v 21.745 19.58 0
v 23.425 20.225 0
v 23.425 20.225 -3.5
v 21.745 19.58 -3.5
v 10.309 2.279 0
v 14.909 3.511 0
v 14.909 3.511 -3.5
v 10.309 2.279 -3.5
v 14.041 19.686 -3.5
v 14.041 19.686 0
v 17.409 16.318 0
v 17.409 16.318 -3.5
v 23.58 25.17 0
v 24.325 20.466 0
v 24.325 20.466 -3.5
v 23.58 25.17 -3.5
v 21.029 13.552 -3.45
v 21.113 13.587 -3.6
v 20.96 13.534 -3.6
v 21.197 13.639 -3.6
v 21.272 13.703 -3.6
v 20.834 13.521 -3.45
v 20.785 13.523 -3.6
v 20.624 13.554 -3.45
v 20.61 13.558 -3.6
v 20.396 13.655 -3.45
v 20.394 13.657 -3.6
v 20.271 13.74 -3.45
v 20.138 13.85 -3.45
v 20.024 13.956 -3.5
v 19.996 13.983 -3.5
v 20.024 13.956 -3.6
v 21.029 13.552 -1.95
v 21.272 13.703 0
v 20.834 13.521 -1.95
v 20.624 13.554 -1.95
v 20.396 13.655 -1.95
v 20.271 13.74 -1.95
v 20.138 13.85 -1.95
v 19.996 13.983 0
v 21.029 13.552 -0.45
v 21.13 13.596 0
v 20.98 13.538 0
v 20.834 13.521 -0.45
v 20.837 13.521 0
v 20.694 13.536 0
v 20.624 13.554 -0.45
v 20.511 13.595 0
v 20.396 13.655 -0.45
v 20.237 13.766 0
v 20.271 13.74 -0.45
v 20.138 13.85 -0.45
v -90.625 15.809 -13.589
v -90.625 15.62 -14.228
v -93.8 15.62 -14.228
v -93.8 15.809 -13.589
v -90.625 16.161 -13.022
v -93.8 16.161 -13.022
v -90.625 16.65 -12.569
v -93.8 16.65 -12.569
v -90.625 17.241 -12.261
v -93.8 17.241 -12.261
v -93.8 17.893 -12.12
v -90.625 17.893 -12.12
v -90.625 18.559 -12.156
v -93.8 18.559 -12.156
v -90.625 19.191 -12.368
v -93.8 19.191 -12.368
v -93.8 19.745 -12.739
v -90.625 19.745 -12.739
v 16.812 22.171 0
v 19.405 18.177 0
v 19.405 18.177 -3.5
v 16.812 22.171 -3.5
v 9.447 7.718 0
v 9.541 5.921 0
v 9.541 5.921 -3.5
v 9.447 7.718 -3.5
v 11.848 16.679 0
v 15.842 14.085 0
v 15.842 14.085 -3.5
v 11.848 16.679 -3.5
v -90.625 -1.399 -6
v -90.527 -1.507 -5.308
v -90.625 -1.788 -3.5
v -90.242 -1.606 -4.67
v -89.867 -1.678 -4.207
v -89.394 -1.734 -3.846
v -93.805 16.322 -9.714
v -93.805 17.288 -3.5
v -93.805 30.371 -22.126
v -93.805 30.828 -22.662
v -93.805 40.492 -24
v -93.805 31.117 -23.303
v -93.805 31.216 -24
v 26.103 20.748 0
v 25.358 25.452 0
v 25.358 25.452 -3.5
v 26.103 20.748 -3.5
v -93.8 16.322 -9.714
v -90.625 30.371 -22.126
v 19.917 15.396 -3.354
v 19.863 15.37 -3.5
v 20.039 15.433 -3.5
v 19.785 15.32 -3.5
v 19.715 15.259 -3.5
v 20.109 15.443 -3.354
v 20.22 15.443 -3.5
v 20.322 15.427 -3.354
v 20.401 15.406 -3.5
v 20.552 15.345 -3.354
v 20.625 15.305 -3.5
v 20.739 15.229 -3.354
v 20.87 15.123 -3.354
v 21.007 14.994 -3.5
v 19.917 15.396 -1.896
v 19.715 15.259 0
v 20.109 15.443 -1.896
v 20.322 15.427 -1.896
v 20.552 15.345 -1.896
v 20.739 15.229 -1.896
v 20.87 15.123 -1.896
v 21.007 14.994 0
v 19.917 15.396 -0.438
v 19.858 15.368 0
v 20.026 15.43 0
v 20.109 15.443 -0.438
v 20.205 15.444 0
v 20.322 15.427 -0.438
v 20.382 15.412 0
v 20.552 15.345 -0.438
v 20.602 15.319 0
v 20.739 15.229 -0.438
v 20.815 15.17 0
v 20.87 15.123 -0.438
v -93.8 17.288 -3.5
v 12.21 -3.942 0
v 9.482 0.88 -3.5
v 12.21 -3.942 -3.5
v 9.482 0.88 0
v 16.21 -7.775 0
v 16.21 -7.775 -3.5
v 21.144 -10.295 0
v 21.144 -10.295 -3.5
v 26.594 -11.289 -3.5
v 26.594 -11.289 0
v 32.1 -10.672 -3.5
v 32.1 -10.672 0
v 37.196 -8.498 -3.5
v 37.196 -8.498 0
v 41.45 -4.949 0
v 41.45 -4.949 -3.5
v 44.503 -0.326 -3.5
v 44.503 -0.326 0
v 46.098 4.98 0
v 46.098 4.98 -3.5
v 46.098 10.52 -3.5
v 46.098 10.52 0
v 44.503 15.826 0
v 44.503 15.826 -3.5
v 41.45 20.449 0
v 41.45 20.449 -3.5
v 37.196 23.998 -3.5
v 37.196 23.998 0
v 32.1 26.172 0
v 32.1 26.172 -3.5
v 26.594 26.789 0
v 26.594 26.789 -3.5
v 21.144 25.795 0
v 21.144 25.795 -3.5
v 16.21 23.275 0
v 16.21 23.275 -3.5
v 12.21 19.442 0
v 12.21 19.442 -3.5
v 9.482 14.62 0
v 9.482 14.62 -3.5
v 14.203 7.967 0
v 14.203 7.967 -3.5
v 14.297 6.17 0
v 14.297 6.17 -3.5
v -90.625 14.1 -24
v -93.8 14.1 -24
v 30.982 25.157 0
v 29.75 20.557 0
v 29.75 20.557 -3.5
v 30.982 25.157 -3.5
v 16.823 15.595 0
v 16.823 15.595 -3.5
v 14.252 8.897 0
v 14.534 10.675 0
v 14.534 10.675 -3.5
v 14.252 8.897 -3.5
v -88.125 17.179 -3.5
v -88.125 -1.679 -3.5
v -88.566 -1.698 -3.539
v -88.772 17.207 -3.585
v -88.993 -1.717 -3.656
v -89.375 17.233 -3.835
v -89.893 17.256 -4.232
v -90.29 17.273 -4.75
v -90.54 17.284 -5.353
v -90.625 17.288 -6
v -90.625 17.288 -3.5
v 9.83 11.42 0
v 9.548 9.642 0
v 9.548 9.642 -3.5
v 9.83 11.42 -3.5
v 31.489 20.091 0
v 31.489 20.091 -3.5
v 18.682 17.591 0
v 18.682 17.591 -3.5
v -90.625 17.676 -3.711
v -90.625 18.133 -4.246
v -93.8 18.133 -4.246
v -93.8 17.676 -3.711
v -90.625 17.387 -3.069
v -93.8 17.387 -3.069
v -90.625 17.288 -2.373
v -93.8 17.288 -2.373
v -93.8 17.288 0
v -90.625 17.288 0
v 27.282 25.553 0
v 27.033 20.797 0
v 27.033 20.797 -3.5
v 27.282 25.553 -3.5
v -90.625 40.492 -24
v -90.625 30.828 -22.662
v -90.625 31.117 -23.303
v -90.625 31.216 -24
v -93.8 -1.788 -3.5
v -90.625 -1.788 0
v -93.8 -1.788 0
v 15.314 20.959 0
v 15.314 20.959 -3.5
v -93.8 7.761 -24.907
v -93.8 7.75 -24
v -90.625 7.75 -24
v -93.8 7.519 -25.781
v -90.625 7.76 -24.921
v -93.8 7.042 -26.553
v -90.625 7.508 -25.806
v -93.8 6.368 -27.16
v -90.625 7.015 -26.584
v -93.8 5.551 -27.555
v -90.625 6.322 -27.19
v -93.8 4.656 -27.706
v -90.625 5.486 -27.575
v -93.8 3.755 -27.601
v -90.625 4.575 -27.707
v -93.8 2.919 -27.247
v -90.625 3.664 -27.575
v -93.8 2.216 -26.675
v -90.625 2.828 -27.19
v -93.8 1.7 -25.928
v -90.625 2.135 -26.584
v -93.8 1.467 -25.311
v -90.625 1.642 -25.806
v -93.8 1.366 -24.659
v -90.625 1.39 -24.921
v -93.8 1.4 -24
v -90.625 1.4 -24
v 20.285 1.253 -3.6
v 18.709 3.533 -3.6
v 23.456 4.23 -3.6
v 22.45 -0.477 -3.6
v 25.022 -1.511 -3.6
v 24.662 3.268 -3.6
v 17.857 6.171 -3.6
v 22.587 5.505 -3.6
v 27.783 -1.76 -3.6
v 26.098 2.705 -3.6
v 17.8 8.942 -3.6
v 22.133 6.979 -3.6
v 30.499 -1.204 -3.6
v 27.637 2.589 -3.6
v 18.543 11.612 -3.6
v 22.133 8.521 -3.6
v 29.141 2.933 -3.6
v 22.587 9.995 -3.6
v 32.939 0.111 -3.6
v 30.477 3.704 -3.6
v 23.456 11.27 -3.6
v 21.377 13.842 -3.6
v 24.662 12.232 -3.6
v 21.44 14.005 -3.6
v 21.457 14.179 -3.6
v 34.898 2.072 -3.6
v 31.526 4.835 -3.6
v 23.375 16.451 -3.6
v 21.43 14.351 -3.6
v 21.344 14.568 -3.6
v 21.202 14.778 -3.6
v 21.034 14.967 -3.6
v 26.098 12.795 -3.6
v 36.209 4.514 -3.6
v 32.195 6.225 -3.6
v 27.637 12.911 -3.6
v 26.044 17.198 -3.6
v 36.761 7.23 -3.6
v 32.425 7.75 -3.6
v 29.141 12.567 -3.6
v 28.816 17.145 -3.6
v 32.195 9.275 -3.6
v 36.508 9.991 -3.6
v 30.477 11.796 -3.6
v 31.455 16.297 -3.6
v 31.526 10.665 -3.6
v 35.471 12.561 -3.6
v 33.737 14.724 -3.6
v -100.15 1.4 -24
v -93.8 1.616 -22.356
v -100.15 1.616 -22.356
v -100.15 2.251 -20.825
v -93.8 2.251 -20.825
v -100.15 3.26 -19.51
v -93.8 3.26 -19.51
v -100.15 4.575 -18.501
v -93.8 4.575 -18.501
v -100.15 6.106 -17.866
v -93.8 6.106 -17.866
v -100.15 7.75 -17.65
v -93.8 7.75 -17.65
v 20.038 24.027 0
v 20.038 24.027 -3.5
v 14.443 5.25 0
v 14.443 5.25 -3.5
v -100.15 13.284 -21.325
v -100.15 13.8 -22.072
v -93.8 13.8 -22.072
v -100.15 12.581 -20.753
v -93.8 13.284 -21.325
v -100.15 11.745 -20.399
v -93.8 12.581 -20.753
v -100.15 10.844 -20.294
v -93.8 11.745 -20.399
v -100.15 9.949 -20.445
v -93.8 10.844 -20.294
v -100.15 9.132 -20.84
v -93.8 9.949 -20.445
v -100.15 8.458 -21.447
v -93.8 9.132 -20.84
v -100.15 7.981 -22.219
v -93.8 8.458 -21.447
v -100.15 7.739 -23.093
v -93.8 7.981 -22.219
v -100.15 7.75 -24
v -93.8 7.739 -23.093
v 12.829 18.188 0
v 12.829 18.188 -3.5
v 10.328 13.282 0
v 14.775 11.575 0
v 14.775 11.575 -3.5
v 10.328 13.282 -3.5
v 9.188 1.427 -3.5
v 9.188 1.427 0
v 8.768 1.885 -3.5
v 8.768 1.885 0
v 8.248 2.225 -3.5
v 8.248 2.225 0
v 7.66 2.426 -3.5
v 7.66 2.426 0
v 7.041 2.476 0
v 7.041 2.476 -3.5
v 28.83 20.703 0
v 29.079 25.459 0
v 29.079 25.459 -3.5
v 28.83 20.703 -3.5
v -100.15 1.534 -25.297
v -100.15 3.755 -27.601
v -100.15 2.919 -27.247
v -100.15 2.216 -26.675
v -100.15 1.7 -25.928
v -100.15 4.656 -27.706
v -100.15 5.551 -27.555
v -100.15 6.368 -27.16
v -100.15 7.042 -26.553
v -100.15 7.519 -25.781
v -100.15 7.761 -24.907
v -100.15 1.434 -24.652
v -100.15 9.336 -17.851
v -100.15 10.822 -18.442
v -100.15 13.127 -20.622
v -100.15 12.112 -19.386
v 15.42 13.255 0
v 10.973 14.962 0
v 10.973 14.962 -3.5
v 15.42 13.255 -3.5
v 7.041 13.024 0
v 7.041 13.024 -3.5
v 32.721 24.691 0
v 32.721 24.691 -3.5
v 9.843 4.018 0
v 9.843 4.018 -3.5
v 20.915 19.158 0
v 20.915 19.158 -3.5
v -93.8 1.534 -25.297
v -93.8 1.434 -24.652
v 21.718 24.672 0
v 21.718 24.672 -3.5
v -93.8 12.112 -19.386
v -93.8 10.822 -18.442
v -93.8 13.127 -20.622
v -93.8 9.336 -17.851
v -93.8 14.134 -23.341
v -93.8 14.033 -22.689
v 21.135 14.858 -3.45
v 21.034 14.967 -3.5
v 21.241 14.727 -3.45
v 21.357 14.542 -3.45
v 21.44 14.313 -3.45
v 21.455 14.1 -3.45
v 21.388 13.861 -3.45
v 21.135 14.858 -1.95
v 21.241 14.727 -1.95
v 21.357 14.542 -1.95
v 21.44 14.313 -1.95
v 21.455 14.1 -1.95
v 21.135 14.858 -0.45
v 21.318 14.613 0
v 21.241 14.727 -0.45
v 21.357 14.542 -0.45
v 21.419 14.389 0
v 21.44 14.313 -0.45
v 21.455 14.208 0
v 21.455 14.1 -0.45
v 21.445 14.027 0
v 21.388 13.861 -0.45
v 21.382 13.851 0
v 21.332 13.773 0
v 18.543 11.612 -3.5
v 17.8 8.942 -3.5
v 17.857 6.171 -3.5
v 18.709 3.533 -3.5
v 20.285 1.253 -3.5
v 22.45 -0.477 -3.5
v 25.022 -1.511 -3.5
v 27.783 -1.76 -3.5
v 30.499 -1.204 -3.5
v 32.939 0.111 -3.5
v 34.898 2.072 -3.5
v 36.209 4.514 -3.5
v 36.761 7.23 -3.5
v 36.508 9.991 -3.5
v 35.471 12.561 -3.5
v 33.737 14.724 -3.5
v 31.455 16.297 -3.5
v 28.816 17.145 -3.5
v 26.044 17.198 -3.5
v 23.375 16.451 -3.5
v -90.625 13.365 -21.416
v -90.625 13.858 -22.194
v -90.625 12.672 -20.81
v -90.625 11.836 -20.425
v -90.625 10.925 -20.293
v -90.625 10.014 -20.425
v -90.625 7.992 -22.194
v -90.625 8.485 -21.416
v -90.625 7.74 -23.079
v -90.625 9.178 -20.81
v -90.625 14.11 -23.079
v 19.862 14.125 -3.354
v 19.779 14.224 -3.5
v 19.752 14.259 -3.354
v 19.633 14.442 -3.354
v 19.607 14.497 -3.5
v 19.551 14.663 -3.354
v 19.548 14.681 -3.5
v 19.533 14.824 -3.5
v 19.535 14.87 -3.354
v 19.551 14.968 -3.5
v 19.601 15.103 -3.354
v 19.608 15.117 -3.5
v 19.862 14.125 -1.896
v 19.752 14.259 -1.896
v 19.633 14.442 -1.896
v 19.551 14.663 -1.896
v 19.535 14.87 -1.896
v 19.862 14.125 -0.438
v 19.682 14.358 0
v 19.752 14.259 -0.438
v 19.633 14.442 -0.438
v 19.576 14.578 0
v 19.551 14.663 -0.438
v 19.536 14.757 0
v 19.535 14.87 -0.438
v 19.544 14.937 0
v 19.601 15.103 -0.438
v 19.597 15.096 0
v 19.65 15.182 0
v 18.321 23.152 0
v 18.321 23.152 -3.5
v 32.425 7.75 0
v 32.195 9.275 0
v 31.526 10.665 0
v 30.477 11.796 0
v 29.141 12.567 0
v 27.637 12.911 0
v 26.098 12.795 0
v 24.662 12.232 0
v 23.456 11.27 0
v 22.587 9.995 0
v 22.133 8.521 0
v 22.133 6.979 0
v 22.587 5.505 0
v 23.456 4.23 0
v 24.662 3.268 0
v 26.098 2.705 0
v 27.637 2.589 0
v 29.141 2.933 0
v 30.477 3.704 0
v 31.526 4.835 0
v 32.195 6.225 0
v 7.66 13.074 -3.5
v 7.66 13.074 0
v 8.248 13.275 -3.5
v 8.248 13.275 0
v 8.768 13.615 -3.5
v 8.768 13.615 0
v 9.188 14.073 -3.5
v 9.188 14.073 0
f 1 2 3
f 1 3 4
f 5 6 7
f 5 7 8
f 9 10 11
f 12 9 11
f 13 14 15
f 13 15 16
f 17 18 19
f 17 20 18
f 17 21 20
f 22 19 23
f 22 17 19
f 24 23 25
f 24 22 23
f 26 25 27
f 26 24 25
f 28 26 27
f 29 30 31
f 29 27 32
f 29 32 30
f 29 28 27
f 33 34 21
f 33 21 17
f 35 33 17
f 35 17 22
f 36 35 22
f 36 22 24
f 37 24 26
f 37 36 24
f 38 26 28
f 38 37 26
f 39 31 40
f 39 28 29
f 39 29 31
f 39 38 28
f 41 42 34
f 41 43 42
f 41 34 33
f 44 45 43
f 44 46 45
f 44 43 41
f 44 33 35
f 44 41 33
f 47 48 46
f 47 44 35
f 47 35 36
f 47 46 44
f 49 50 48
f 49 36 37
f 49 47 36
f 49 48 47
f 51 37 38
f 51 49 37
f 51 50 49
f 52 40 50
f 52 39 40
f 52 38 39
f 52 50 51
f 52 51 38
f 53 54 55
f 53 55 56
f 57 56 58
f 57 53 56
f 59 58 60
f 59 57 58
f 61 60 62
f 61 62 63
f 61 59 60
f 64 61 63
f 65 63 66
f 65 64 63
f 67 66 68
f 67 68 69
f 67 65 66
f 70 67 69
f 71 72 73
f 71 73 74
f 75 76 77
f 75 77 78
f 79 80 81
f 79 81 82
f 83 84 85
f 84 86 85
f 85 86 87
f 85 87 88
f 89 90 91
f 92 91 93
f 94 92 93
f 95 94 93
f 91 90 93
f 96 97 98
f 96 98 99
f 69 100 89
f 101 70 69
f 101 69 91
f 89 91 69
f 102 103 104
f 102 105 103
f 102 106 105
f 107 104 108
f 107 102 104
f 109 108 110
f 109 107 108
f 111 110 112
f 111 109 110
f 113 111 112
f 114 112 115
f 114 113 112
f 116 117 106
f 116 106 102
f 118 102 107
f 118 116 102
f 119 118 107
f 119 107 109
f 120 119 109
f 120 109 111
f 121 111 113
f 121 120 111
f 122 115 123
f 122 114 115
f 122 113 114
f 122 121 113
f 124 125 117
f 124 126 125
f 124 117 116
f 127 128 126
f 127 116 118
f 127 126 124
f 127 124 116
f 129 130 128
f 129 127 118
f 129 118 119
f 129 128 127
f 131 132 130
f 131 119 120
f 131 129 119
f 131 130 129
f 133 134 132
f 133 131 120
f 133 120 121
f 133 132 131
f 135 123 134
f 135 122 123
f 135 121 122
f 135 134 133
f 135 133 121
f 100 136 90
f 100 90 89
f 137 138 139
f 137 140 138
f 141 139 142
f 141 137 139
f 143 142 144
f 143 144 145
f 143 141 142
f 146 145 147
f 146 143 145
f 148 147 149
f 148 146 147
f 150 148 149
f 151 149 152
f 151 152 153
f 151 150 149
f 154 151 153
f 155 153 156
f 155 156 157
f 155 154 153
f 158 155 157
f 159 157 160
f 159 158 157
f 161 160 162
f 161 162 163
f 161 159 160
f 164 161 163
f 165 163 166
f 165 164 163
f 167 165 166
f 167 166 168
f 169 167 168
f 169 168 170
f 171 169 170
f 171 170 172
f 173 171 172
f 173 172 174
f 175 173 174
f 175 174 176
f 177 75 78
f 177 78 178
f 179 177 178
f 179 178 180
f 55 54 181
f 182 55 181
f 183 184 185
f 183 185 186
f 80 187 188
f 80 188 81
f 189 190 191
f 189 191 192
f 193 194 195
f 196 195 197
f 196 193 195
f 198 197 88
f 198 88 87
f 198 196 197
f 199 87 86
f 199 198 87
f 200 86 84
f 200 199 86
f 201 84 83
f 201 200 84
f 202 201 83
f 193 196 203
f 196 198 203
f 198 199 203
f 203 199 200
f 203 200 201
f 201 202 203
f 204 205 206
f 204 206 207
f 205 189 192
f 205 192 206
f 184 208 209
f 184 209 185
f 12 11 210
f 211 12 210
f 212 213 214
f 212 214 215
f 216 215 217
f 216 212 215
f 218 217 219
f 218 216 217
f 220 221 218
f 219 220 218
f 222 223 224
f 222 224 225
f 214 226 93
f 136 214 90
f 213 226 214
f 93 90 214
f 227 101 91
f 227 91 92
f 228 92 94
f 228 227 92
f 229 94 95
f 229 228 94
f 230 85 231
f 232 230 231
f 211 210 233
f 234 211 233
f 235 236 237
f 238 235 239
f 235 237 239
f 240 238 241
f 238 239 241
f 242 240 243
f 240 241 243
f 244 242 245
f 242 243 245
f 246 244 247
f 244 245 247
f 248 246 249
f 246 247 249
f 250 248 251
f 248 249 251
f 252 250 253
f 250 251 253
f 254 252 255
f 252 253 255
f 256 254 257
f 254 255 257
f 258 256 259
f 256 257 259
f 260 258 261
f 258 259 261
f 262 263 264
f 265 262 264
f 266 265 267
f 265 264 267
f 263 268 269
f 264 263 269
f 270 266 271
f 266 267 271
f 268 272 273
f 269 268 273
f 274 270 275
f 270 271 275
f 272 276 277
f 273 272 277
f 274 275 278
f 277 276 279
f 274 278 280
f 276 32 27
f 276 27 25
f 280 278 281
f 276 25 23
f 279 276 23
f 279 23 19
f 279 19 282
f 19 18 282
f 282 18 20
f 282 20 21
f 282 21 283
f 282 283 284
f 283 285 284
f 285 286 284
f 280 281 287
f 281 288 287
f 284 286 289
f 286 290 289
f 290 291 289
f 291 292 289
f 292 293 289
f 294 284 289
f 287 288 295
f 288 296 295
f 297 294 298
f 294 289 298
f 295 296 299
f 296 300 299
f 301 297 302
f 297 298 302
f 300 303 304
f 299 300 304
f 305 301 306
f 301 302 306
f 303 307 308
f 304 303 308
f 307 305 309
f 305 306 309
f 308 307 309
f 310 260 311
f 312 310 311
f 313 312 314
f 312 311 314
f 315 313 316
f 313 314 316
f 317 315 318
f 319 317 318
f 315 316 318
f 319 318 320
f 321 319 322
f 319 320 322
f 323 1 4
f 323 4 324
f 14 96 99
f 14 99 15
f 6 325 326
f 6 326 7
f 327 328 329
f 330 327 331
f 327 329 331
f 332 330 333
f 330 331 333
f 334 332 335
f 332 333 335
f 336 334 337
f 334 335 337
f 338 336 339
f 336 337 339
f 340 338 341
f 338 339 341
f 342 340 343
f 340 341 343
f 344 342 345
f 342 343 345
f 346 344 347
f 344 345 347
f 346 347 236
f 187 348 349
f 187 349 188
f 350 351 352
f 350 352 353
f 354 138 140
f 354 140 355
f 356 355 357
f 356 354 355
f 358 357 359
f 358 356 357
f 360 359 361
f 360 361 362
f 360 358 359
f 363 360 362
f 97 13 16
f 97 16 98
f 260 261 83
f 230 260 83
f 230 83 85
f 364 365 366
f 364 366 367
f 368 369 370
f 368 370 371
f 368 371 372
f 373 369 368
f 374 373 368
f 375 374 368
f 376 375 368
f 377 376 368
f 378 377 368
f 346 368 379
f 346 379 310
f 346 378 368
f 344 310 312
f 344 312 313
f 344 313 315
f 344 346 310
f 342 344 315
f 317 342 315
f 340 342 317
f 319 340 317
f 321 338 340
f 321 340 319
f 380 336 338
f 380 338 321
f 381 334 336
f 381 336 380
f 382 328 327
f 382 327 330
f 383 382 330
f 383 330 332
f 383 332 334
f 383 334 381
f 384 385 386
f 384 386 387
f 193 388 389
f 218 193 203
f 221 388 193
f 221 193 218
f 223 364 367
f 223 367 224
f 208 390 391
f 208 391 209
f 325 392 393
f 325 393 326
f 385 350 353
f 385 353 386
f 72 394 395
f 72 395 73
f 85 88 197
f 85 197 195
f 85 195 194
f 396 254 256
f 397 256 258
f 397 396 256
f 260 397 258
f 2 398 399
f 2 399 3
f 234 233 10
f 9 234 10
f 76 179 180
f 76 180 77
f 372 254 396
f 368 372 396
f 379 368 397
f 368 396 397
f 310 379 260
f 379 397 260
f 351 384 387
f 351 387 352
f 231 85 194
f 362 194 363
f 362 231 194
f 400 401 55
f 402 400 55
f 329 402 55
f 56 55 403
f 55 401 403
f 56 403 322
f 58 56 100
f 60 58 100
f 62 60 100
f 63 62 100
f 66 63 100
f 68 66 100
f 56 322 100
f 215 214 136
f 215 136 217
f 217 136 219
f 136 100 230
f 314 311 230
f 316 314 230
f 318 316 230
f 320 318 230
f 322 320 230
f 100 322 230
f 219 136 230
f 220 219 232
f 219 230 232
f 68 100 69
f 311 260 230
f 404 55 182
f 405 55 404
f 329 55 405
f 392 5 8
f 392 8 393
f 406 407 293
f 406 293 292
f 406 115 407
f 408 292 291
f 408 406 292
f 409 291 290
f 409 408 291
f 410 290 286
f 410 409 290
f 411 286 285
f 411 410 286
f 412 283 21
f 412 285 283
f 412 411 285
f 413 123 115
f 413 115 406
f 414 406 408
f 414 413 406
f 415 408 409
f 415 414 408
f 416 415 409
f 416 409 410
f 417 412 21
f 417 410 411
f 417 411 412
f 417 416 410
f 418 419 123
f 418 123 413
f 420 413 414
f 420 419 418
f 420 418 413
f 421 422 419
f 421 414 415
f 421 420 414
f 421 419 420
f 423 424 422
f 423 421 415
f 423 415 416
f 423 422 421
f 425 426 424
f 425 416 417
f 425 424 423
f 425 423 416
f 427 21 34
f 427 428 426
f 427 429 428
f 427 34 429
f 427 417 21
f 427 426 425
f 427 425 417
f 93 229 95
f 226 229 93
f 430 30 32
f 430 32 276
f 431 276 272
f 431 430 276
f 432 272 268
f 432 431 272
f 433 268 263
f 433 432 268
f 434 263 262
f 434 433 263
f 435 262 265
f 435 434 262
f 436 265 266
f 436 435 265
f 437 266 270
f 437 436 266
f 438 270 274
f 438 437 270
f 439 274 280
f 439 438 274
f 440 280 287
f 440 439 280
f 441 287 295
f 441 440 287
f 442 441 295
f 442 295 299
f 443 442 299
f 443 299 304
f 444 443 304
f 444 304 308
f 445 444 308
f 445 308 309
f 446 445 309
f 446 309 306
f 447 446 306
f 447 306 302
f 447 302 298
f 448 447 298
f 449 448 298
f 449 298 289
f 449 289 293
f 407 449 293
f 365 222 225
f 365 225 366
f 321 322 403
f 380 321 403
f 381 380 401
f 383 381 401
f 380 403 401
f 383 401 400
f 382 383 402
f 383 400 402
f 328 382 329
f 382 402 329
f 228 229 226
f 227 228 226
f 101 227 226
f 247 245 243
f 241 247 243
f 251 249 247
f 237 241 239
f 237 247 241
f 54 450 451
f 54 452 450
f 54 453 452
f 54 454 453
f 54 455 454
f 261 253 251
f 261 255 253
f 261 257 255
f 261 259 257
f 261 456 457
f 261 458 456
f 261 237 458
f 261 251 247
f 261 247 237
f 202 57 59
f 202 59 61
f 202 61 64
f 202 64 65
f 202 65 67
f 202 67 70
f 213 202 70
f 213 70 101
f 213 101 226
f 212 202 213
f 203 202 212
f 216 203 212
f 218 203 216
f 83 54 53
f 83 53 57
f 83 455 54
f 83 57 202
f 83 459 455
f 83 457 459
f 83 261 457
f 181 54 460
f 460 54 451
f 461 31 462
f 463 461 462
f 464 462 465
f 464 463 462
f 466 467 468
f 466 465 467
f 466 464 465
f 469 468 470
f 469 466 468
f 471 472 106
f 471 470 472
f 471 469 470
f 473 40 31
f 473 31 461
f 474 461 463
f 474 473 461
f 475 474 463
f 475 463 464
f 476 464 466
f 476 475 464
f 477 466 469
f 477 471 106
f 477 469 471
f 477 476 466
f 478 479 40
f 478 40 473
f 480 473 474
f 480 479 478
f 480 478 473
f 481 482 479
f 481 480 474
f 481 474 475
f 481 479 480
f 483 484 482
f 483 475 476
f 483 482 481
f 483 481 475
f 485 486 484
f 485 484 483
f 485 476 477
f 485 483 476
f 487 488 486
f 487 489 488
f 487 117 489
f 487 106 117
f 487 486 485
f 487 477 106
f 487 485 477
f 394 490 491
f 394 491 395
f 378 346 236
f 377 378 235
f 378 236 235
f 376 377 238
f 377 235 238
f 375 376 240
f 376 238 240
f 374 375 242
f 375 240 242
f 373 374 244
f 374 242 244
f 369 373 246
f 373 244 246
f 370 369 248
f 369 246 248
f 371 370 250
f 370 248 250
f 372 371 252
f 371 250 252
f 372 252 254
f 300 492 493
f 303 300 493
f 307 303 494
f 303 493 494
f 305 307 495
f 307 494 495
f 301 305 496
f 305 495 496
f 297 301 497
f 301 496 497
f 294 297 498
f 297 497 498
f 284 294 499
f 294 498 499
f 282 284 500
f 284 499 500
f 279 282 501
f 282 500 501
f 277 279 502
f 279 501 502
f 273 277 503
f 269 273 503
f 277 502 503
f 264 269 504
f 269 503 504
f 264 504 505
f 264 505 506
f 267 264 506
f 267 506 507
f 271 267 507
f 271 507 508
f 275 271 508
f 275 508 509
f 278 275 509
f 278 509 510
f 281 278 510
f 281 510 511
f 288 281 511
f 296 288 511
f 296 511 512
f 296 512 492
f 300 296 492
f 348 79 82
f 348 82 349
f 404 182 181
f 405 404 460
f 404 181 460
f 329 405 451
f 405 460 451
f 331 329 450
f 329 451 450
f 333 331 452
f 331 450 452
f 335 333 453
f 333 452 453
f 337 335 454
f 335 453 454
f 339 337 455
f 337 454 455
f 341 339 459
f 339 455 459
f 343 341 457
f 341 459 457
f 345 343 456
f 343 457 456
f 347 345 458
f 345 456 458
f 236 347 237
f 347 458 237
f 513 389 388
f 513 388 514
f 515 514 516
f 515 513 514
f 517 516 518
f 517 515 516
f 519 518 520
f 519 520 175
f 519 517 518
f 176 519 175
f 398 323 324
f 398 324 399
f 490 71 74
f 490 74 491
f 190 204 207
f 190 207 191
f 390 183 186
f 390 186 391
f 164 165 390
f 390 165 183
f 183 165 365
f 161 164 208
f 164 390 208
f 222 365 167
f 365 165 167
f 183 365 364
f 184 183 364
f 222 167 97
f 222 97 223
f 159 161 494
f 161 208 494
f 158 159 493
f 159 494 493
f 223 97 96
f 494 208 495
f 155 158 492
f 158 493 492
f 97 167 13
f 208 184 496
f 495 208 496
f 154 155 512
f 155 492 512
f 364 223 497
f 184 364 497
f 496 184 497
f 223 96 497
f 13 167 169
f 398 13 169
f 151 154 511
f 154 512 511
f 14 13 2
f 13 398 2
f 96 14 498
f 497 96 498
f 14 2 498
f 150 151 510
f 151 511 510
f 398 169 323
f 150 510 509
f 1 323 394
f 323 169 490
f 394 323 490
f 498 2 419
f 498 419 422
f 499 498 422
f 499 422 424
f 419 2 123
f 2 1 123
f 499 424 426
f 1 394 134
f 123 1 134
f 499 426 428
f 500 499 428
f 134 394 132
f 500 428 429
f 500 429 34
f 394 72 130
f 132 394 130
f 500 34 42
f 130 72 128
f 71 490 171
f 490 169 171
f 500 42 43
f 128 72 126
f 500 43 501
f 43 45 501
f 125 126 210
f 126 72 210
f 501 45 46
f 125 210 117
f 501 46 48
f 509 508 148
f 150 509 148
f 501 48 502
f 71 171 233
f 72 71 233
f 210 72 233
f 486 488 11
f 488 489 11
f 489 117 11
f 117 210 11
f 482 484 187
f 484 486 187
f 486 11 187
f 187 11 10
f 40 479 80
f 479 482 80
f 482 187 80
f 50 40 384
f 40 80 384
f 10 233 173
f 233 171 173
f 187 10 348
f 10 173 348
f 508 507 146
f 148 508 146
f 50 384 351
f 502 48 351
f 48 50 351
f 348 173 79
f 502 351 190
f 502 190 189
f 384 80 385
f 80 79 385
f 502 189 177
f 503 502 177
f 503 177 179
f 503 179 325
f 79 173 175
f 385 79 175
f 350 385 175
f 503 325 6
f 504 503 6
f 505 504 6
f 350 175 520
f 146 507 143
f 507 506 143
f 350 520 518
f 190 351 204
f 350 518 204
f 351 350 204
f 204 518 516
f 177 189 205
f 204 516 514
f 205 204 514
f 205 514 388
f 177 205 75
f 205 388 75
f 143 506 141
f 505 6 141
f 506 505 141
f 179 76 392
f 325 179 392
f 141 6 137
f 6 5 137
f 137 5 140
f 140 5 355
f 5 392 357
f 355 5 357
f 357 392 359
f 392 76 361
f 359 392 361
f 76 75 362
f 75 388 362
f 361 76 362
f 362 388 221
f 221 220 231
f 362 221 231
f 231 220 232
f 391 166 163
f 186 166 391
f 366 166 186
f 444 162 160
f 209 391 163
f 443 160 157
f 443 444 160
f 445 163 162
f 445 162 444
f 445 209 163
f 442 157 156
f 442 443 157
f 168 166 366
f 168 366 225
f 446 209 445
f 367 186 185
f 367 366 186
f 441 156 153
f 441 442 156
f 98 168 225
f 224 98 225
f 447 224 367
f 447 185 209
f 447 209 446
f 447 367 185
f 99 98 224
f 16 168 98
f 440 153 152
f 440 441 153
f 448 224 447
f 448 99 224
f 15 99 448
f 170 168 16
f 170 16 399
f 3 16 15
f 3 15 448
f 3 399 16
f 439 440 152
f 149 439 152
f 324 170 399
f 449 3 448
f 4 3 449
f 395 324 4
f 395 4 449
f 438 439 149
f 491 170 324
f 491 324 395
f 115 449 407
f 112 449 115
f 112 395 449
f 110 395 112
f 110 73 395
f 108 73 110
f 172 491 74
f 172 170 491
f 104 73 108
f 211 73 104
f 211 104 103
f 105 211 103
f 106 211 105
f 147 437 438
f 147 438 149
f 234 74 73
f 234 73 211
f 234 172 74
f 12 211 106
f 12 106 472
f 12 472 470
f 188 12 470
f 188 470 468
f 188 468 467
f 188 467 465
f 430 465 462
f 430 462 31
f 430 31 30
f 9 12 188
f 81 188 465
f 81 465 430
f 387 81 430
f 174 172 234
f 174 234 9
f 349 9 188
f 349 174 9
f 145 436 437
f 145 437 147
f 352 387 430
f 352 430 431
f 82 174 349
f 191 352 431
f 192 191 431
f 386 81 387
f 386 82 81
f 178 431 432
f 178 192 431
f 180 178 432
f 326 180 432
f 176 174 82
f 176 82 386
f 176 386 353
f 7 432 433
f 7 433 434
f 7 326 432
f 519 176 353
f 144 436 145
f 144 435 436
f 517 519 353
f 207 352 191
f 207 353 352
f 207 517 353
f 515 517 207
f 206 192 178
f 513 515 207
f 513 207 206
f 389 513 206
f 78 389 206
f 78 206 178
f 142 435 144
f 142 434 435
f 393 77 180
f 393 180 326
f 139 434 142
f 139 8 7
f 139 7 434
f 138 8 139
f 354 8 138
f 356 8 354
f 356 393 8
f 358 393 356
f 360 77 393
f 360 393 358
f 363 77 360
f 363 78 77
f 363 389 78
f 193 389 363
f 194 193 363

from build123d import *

# Parameters (mm, degrees)
SKETCH1_R           = 9.525
SKETCH1_R_2         = 5.175
BOSS_EXTRUDE1_DEPTH = 3.6
BOSS_EXTRUDE2_DEPTH = 3.5
SKETCH3_R           = 19.05
SKETCH3_R_2         = 5.175
BOSS_EXTRUDE3_DEPTH = 3.5
CUT_EXTRUDE1_DEPTH  = 95.573202468
BOSS_EXTRUDE4_DEPTH = 3.175
BOSS_EXTRUDE5_DEPTH = 6.35
BOSS_EXTRUDE6_DEPTH = 3.18
FILLET1_R           = 2.5


with BuildPart() as part:
    # Sketch1 → Boss-Extrude1 (new body)
    with BuildSketch(Plane.XY):
        with Locations((27.25, 7.75)):
            Circle(SKETCH1_R)
        with Locations((27.25, 7.75)):
            Circle(SKETCH1_R_2, mode=Mode.SUBTRACT)
    extrude(amount=-BOSS_EXTRUDE1_DEPTH)

    # Sketch2 → Boss-Extrude2 (add)
    with BuildSketch(Plane.XY):
        Polygon((18.995, 12.501904881), (-90.625, 17.288017443), (-90.625, -1.788017443), (18.995, 2.998095119), align=None)
    extrude(amount=-BOSS_EXTRUDE2_DEPTH)

    # Sketch3 → Boss-Extrude3 (add)
    with BuildSketch(Plane.XY):
        with Locations((27.25, 7.75)):
            Circle(SKETCH3_R)
        with Locations((27.25, 7.75)):
            Circle(SKETCH3_R_2, mode=Mode.SUBTRACT)
    extrude(amount=-BOSS_EXTRUDE3_DEPTH)

    # Sketch4 → Cut-Extrude1 (cut, through all)
    # profile 1 of 12: a face of its own
    with BuildSketch(Plane.XY):
        Polygon((19.405357851, 18.177218987), (16.811514446, 22.171387567), (18.321121469, 23.15173783), (20.914964873, 19.15756925), align=None)
    # profile 2 of 12: a face of its own
    with BuildSketch(Plane.XY):
        Polygon((17.408841373, 16.318366421), (18.681633579, 17.591158627), (15.314037534, 20.958754673), (14.041245327, 19.685962466), align=None)
    # profile 3 of 12: a face of its own
    with BuildSketch(Plane.XY):
        Polygon((21.744722833, 19.580352047), (20.037995473, 24.026528829), (21.718440241, 24.671591138), (23.425167601, 20.225414357), align=None)
    # profile 4 of 12: a face of its own
    with BuildSketch(Plane.XY):
        Polygon((24.324694845, 20.466441955), (23.579675705, 25.170307677), (25.357514718, 25.451889714), (26.102533858, 20.748023992), align=None)
    # profile 5 of 12: a face of its own
    with BuildSketch(Plane.XY):
        Polygon((27.032516729, 20.796762329), (27.281766721, 25.552735489), (29.079299883, 25.458530767), (28.830049892, 20.702557608), align=None)
    # profile 6 of 12: a face of its own
    with BuildSketch(Plane.XY):
        Polygon((29.749843676, 20.556876584), (30.982469378, 25.157098332), (32.721135866, 24.691224051), (31.488510163, 20.091002303), align=None)
    # profile 7 of 12: a face of its own
    with BuildSketch(Plane.XY):
        Polygon((15.84243075, 14.085035127), (11.84826217, 16.678878531), (12.828612433, 18.188485554), (16.822781013, 15.594642149), align=None)
    # profile 8 of 12: a face of its own
    with BuildSketch(Plane.XY):
        Polygon((14.774585643, 11.574832399), (10.328408862, 13.281559759), (10.973471171, 14.962004527), (15.419647953, 13.255277167), align=None)
    # profile 9 of 12: a face of its own
    with BuildSketch(Plane.XY):
        Polygon((14.251976008, 8.897466142), (9.548110286, 9.642485282), (9.829692323, 11.420324295), (14.533558045, 10.675305155), align=None)
    # profile 10 of 12: a face of its own
    with BuildSketch(Plane.XY):
        Polygon((14.297442392, 6.169950108), (9.541469233, 5.920700117), (9.447264511, 7.718233279), (14.203237671, 7.967483271), align=None)
    # profile 11 of 12: a face of its own
    with BuildSketch(Plane.XY):
        Polygon((14.908997697, 3.511489837), (10.308775949, 2.278864134), (9.842901668, 4.017530622), (14.443123416, 5.250156324), align=None)
    # profile 12 of 12: a face of its own
    with BuildSketch(Plane.XY):
        with BuildLine():
            add(Edge.make_bspline(
                [(19.996175693, 13.983105039), (19.972549804, 14.006974852), (19.926684107, 14.053314085), (19.862635122, 14.123340739), (19.804807719, 14.191245488), (19.753115011, 14.256928744), (19.706902346, 14.320187557), (19.667123485, 14.381475924), (19.633241886, 14.440499093), (19.605838218, 14.49786121), (19.583891907, 14.553730575), (19.565373741, 14.60828689), (19.550882076, 14.662068546), (19.540580443, 14.715204363), (19.534737441, 14.767524979), (19.532388566, 14.819113596), (19.53464102, 14.869868179), (19.540484051, 14.919643175), (19.550380726, 14.968074585), (19.563399735, 15.015027998), (19.579921539, 15.060371004), (19.600563009, 15.10350851), (19.62372625, 15.145488903), (19.651184569, 15.185108897), (19.681148524, 15.223804161), (19.703943722, 15.247425917), (19.715479913, 15.259380413)],
                knots=[0, 0, 0, 0, 1.644941701, 3.193378015, 4.647145852, 6.012736372, 7.286740979, 8.483061719, 9.58992218, 10.61798452, 11.593737178, 12.528549707, 13.438735705, 14.319919232, 15.176948591, 16.015348648, 16.846831638, 17.662602897, 18.467729349, 19.265590275, 20.047523624, 20.827953815, 21.605954429, 22.393232775, 23.186847407, 24, 24, 24, 24], degree=3))
            add(Edge.make_bspline(
                [(19.715479913, 15.259380413), (19.72757601, 15.271056951), (19.751480133, 15.294131948), (19.79059328, 15.32453002), (19.830653616, 15.352371474), (19.872934823, 15.376073956), (19.916815537, 15.396640202), (19.962550005, 15.413433609), (20.009989946, 15.427159873), (20.059028168, 15.437329522), (20.109640093, 15.443588369), (20.161391726, 15.446416818), (20.214253243, 15.443872509), (20.268139075, 15.438159389), (20.323009446, 15.427596366), (20.379119371, 15.413908829), (20.435954787, 15.394752005), (20.494277642, 15.372380194), (20.553991919, 15.345222785), (20.614763563, 15.31181632), (20.6768047, 15.272675401), (20.740699924, 15.228555913), (20.805586165, 15.178199697), (20.871982932, 15.122240246), (20.939915396, 15.060760529), (20.984561985, 15.016868227), (21.007443722, 14.994373068)],
                knots=[0, 0, 0, 0, 0.81750105, 1.615533254, 2.407168602, 3.189397808, 3.970901104, 4.762954563, 5.55742278, 6.372083968, 7.196957306, 8.037000563, 8.890477321, 9.76918381, 10.671577351, 11.607318308, 12.577284202, 13.587520184, 14.64617593, 15.76641423, 16.959043917, 18.21433275, 19.543145185, 20.953794228, 22.438794936, 24, 24, 24, 24], degree=3))
            add(Edge.make_bspline(
                [(21.007443722, 14.994373068), (21.029939345, 14.971491973), (21.07369258, 14.926989007), (21.134906952, 14.859351767), (21.190415056, 14.793244214), (21.24085702, 14.728727202), (21.285167215, 14.665378577), (21.324082766, 14.603618046), (21.35744776, 14.543475592), (21.384594418, 14.48417647), (21.406973112, 14.426279284), (21.426121387, 14.369867226), (21.439873538, 14.314050657), (21.450373252, 14.259306853), (21.456117386, 14.205282675), (21.45863553, 14.152136819), (21.455811599, 14.099963135), (21.449552444, 14.048928037), (21.439380503, 13.999468399), (21.425663125, 13.951600834), (21.408844197, 13.905459094), (21.388425087, 13.861212706), (21.364450808, 13.818808922), (21.336898184, 13.778413534), (21.306335612, 13.739270233), (21.283273208, 13.715357657), (21.271603044, 13.703257283)],
                knots=[0, 0, 0, 0, 1.562235313, 3.038495437, 4.440379466, 5.764626062, 7.024677084, 8.202776689, 9.317717587, 10.370816988, 11.375304419, 12.339374423, 13.269058028, 14.172047064, 15.051333417, 15.912249674, 16.759720868, 17.591966788, 18.41390586, 19.215513145, 20.014546285, 20.802808402, 21.585553806, 22.383400645, 23.181959475, 24, 24, 24, 24], degree=3))
            add(Edge.make_bspline(
                [(21.271603044, 13.703257283), (21.259629026, 13.691746239), (21.23604856, 13.66907751), (21.197734192, 13.638805411), (21.158183947, 13.611660672), (21.116515089, 13.588202529), (21.073534989, 13.567814799), (21.028537333, 13.551158533), (20.981994239, 13.538163004), (20.933989646, 13.528262893), (20.884634953, 13.522407258), (20.834167195, 13.520202748), (20.782683445, 13.522376174), (20.73042296, 13.5289079), (20.67731692, 13.539143901), (20.623181435, 13.553199413), (20.568109964, 13.571523386), (20.511768493, 13.594048796), (20.454021813, 13.622036447), (20.394346939, 13.655485363), (20.332806089, 13.695249792), (20.269074183, 13.740726075), (20.203509794, 13.792477155), (20.136108776, 13.850566204), (20.065946419, 13.913865736), (20.019874065, 13.959587171), (19.996175693, 13.983105039)],
                knots=[0, 0, 0, 0, 0.813987375, 1.602987522, 2.391074088, 3.163837422, 3.945068801, 4.721304689, 5.513312182, 6.312473106, 7.122201215, 7.947613738, 8.786874495, 9.645595022, 10.52768317, 11.43703601, 12.385957169, 13.371717227, 14.410080332, 15.530148071, 16.72394133, 18.000834515, 19.367826948, 20.817813834, 22.363169582, 24, 24, 24, 24], degree=3))
        make_face()
        with BuildLine():
            add(Edge.make_bspline(
                [(20.139491665, 14.120484847), (20.159842261, 14.10026479), (20.199282005, 14.06107803), (20.258825996, 14.006696987), (20.315157902, 13.956648767), (20.36946228, 13.91227584), (20.421015188, 13.872453316), (20.470698769, 13.838793642), (20.517294119, 13.809391318), (20.562274922, 13.785969667), (20.60570856, 13.766694324), (20.648080537, 13.750402661), (20.6900298, 13.737655615), (20.731300233, 13.728383676), (20.771914432, 13.721759849), (20.812064975, 13.718808576), (20.851623834, 13.719298353), (20.902639916, 13.723732634), (20.963368961, 13.736271903), (21.030845369, 13.761355865), (21.091551409, 13.796275379), (21.125667075, 13.82699342), (21.142703471, 13.842333137)],
                knots=[0, 0, 0, 0, 1.478828575, 2.865990936, 4.156734116, 5.36308544, 6.480889949, 7.513666501, 8.455984072, 9.319688948, 10.125381605, 10.904881632, 11.658652575, 12.383407565, 13.084213992, 13.778321268, 14.456017801, 15.121659285, 16.41638644, 17.638501444, 18.820734642, 20, 20, 20, 20], degree=3))
            add(Edge.make_bspline(
                [(21.142703471, 13.842333137), (21.158237309, 13.859333277), (21.189151543, 13.89316563), (21.223390961, 13.953683956), (21.248748637, 14.019779969), (21.261375212, 14.079417608), (21.265678182, 14.129451086), (21.266398281, 14.168334547), (21.262604874, 14.20785819), (21.256376505, 14.24827996), (21.246514017, 14.289516324), (21.233214252, 14.331341198), (21.217255365, 14.3741679), (21.20384511, 14.402126104), (21.196976975, 14.41644505)],
                knots=[0, 0, 0, 0, 1.339481627, 2.665731908, 4.025256516, 5.457778452, 6.202644314, 6.952873897, 7.722377096, 8.515238795, 9.337057588, 10.192268171, 11.074160362, 12, 12, 12, 12], degree=3))
            add(Edge.make_bspline(
                [(21.196976975, 14.41644505), (21.187973627, 14.434350806), (21.169636182, 14.47082011), (21.138179389, 14.524604008), (21.102557105, 14.578418398), (21.064470083, 14.633337931), (21.020981154, 14.687380173), (20.975094965, 14.742656801), (20.924859167, 14.797821639), (20.889404387, 14.83392842), (20.87133595, 14.852329131)],
                knots=[0, 0, 0, 0, 0.879877645, 1.792078736, 2.733637099, 3.713363695, 4.725250154, 5.778099888, 6.867676946, 8, 8, 8, 8], degree=3))
            add(Edge.make_bspline(
                [(20.87133595, 14.852329131), (20.85293091, 14.870394121), (20.817032712, 14.905629066), (20.762551079, 14.955367796), (20.709270708, 15.001073456), (20.657080441, 15.043043344), (20.605259068, 15.080077675), (20.554916646, 15.113936398), (20.50519563, 15.143058684), (20.456779694, 15.168776163), (20.409426539, 15.190288012), (20.363298462, 15.208334264), (20.31839389, 15.222725096), (20.274695443, 15.233953882), (20.232016746, 15.241307261), (20.190582362, 15.244613497), (20.150298797, 15.244724339), (20.099268913, 15.240215062), (20.039015716, 15.227597661), (19.972406236, 15.202799422), (19.911999572, 15.169092426), (19.878484301, 15.13852322), (19.861763968, 15.123272641)],
                knots=[0, 0, 0, 0, 1.331365774, 2.596768798, 3.807708333, 4.955277549, 6.052926775, 7.095188675, 8.086337056, 9.026368116, 9.92436562, 10.769928982, 11.582219143, 12.357378997, 13.097541491, 13.815019859, 14.500931769, 15.174783094, 16.457052075, 17.664667297, 18.834932833, 20, 20, 20, 20], degree=3))
            add(Edge.make_bspline(
                [(19.861763968, 15.123272641), (19.846235795, 15.106269619), (19.815119572, 15.072198013), (19.780593138, 15.01114956), (19.755313654, 14.944098329), (19.74268388, 14.88378236), (19.738333486, 14.833183193), (19.737770771, 14.79390012), (19.740933039, 14.754081851), (19.746875648, 14.713394638), (19.756141644, 14.672123078), (19.769056969, 14.630225368), (19.785373303, 14.587876991), (19.804420811, 14.544195974), (19.828111656, 14.499075995), (19.857227018, 14.452165818), (19.891065617, 14.402451645), (19.930829853, 14.350856026), (19.975390734, 14.296573577), (20.025112965, 14.239683187), (20.080125163, 14.180441993), (20.119308315, 14.140869004), (20.139491665, 14.120484847)],
                knots=[0, 0, 0, 0, 1.184098183, 2.372762314, 3.588199925, 4.868807811, 5.53452642, 6.205014416, 6.891934544, 7.591722619, 8.32367034, 9.070557309, 9.850147652, 10.662595738, 11.526400688, 12.475033872, 13.507930086, 14.625864108, 15.832355206, 17.128728501, 18.521000081, 20, 20, 20, 20], degree=3))
        make_face(mode=Mode.SUBTRACT)
    extrude(amount=-CUT_EXTRUDE1_DEPTH, mode=Mode.SUBTRACT)


with BuildPart() as cut_extrude1_kept_piece:
    # of the separate pieces the step leaves, the one the design keeps (cut_extrude1_pieces_kept)
    add(part.part.solids().sort_by_distance((8.921106691, 2.558259438, 0))[0])

    # Sketch5 → Boss-Extrude4 (add)
    with BuildSketch(Plane.ZY.offset(90.625)):
        with BuildLine():
            Line((0, 17.288017443), (-3.5, 17.288017443))
            Line((-3.5, 17.288017443), (-24, 14.1))
            ThreePointArc((-24, 14.1), (-20.29308285, 10.925), (-24, 7.75))
            ThreePointArc((-24, 7.75), (-27.70691715, 4.575), (-24, 1.4))
            Line((-24, 1.4), (-3.5, -1.788017443))
            Line((-3.5, -1.788017443), (0, -1.788017443))
            Line((0, -1.788017443), (0, 17.288017443))
        make_face()
    extrude(amount=BOSS_EXTRUDE4_DEPTH)

    # Sketch6 → Boss-Extrude5 (add)
    with BuildSketch(Plane.ZY.offset(93.8)):
        with BuildLine():
            ThreePointArc((-25.928379169, 1.699888118), (-24.975779061, 1.475419917), (-24, 1.4))
            ThreePointArc((-24, 1.4), (-19.509871939, 3.259871939), (-17.65, 7.75))
            ThreePointArc((-17.65, 7.75), (-18.873221883, 11.496818135), (-22.071620831, 13.800111882))
            ThreePointArc((-22.071620831, 13.800111882), (-20.444829224, 9.949220939), (-24, 7.75))
            ThreePointArc((-24, 7.75), (-27.555170776, 5.550779061), (-25.928379169, 1.699888118))
        make_face()
    extrude(amount=BOSS_EXTRUDE5_DEPTH)

    # Sketch9 → Boss-Extrude6 (add)
    with BuildSketch(Plane(origin=(-90.625, 0, 0), x_dir=(0, 0, -1), z_dir=(1, 0, 0))):
        Polygon((24, 40.4921875), (3.5, 17.288017443), (9.713960097, 16.32166558), (22.126436487, 30.371480848), (24, 32.4921875), align=None)
        with BuildLine():
            Line((24, 31.21625888), (24, 32.4921875))
            Line((24, 32.4921875), (22.126436487, 30.371480848))
            ThreePointArc((22.126436487, 30.371480848), (22.972394755, 30.995299788), (24, 31.21625888))
        make_face()
    extrude(amount=-BOSS_EXTRUDE6_DEPTH)

    # Fillet1
    # the kernel refuses this fillet: 2.5 mm, written as the material it adds along each edge
    with BuildSketch(Plane(origin=(-90.625, 17.288017443, -3.5), x_dir=(0, 0, 1), z_dir=(-1, 0, 0))) as fillet1_piece_1:
        with BuildLine():
            CenterArc((FILLET1_R * 0.450893725471, FILLET1_R), FILLET1_R, 221.45937079, 48.54062921)
            Line((-FILLET1_R * 0.29853167979, FILLET1_R * 0.337911212941), (0, 0))
            Line((0, 0), (FILLET1_R * 0.450893725471, 0))
        make_face()
    extrude(amount=3.175)
    with BuildSketch(Plane(origin=(-90.625, 16.32166558, -9.713960097), x_dir=(0, -0.15366599387417892, -0.9881228477910329), z_dir=(-1, 0, 0))) as fillet1_piece_2:
        with BuildLine():
            CenterArc((FILLET1_R * 1.82729194014, -FILLET1_R), FILLET1_R, 90, 122.61993432)
            Line((FILLET1_R * 0.98502704299, -FILLET1_R * 1.53906385803), (0, 0))
            Line((0, 0), (FILLET1_R * 1.82729194014, 0))
        make_face()
    extrude(amount=3.175)
    with BuildSketch(Plane(origin=(-90.625, 23.538017443, -3.5), x_dir=(1, 0, 0), z_dir=(0, -1, 0))) as fillet1_piece_3_section:
        with BuildLine():
            CenterArc((FILLET1_R, -FILLET1_R), FILLET1_R, 90, 90)
            Line((0, -FILLET1_R), (0, 0))
            Line((0, 0), (FILLET1_R, 0))
        make_face()
    fillet1_piece_3 = extrude(amount=31.576034886, mode=Mode.PRIVATE)
    fillet1_piece_3 = split(fillet1_piece_3, bisect_by=Plane(origin=(-89.653341221, 17.245593904, -4.057124871), z_dir=(-0.043619387365339574, -0.9990482215818577, 0)), keep=Keep.TOP, mode=Mode.PRIVATE)
    fillet1_piece_3 = split(fillet1_piece_3, bisect_by=Plane(origin=(-89.650267131, -1.745459687, -4.057124871), z_dir=(-0.0436193873653328, 0.9990482215818579, 0)), keep=Keep.TOP, mode=Mode.PRIVATE)
    fillet1_piece_3 = split(fillet1_piece_3, bisect_by=Plane(origin=(-90.066387829, -1.477366772, -5.49758592), z_dir=(0, 0.9881228477910331, 0.15366599387417806)), keep=Keep.TOP, mode=Mode.PRIVATE)
    add(fillet1_piece_3)
    with BuildSketch(Plane(origin=(8.921106691, 2.558259438, -3.5), x_dir=(0.31692008603336363, -0.9484522439578101, 0), z_dir=(0, 0, 1))) as fillet1_piece_4:
        with BuildLine():
            CenterArc((1.88545219, -2.497302737), FILLET1_R, 92.661756664, 71.361476718)
            Line((-0.517981279, -1.80918388), (0, 0))
            ThreePointArc((0, 0), (0.884676459, -0.020553146), (1.769352917, 0))
        make_face()
    extrude(amount=3.5)
    with BuildSketch(Plane(origin=(8.921106691, 12.941740562, -3.5), x_dir=(0.31692008603337163, 0.9484522439578075, 0), z_dir=(0, 0, 1))) as fillet1_piece_5:
        with BuildLine():
            CenterArc((1.88545219, 2.497302737), FILLET1_R, 195.976766619, 71.361476718)
            Line((-0.517981279, 1.80918388), (0, 0))
            ThreePointArc((0, 0), (0.884676459, 0.020553146), (1.769352917, 0))
        make_face()
    extrude(amount=3.5)


solid = cut_extrude1_kept_piece.part
